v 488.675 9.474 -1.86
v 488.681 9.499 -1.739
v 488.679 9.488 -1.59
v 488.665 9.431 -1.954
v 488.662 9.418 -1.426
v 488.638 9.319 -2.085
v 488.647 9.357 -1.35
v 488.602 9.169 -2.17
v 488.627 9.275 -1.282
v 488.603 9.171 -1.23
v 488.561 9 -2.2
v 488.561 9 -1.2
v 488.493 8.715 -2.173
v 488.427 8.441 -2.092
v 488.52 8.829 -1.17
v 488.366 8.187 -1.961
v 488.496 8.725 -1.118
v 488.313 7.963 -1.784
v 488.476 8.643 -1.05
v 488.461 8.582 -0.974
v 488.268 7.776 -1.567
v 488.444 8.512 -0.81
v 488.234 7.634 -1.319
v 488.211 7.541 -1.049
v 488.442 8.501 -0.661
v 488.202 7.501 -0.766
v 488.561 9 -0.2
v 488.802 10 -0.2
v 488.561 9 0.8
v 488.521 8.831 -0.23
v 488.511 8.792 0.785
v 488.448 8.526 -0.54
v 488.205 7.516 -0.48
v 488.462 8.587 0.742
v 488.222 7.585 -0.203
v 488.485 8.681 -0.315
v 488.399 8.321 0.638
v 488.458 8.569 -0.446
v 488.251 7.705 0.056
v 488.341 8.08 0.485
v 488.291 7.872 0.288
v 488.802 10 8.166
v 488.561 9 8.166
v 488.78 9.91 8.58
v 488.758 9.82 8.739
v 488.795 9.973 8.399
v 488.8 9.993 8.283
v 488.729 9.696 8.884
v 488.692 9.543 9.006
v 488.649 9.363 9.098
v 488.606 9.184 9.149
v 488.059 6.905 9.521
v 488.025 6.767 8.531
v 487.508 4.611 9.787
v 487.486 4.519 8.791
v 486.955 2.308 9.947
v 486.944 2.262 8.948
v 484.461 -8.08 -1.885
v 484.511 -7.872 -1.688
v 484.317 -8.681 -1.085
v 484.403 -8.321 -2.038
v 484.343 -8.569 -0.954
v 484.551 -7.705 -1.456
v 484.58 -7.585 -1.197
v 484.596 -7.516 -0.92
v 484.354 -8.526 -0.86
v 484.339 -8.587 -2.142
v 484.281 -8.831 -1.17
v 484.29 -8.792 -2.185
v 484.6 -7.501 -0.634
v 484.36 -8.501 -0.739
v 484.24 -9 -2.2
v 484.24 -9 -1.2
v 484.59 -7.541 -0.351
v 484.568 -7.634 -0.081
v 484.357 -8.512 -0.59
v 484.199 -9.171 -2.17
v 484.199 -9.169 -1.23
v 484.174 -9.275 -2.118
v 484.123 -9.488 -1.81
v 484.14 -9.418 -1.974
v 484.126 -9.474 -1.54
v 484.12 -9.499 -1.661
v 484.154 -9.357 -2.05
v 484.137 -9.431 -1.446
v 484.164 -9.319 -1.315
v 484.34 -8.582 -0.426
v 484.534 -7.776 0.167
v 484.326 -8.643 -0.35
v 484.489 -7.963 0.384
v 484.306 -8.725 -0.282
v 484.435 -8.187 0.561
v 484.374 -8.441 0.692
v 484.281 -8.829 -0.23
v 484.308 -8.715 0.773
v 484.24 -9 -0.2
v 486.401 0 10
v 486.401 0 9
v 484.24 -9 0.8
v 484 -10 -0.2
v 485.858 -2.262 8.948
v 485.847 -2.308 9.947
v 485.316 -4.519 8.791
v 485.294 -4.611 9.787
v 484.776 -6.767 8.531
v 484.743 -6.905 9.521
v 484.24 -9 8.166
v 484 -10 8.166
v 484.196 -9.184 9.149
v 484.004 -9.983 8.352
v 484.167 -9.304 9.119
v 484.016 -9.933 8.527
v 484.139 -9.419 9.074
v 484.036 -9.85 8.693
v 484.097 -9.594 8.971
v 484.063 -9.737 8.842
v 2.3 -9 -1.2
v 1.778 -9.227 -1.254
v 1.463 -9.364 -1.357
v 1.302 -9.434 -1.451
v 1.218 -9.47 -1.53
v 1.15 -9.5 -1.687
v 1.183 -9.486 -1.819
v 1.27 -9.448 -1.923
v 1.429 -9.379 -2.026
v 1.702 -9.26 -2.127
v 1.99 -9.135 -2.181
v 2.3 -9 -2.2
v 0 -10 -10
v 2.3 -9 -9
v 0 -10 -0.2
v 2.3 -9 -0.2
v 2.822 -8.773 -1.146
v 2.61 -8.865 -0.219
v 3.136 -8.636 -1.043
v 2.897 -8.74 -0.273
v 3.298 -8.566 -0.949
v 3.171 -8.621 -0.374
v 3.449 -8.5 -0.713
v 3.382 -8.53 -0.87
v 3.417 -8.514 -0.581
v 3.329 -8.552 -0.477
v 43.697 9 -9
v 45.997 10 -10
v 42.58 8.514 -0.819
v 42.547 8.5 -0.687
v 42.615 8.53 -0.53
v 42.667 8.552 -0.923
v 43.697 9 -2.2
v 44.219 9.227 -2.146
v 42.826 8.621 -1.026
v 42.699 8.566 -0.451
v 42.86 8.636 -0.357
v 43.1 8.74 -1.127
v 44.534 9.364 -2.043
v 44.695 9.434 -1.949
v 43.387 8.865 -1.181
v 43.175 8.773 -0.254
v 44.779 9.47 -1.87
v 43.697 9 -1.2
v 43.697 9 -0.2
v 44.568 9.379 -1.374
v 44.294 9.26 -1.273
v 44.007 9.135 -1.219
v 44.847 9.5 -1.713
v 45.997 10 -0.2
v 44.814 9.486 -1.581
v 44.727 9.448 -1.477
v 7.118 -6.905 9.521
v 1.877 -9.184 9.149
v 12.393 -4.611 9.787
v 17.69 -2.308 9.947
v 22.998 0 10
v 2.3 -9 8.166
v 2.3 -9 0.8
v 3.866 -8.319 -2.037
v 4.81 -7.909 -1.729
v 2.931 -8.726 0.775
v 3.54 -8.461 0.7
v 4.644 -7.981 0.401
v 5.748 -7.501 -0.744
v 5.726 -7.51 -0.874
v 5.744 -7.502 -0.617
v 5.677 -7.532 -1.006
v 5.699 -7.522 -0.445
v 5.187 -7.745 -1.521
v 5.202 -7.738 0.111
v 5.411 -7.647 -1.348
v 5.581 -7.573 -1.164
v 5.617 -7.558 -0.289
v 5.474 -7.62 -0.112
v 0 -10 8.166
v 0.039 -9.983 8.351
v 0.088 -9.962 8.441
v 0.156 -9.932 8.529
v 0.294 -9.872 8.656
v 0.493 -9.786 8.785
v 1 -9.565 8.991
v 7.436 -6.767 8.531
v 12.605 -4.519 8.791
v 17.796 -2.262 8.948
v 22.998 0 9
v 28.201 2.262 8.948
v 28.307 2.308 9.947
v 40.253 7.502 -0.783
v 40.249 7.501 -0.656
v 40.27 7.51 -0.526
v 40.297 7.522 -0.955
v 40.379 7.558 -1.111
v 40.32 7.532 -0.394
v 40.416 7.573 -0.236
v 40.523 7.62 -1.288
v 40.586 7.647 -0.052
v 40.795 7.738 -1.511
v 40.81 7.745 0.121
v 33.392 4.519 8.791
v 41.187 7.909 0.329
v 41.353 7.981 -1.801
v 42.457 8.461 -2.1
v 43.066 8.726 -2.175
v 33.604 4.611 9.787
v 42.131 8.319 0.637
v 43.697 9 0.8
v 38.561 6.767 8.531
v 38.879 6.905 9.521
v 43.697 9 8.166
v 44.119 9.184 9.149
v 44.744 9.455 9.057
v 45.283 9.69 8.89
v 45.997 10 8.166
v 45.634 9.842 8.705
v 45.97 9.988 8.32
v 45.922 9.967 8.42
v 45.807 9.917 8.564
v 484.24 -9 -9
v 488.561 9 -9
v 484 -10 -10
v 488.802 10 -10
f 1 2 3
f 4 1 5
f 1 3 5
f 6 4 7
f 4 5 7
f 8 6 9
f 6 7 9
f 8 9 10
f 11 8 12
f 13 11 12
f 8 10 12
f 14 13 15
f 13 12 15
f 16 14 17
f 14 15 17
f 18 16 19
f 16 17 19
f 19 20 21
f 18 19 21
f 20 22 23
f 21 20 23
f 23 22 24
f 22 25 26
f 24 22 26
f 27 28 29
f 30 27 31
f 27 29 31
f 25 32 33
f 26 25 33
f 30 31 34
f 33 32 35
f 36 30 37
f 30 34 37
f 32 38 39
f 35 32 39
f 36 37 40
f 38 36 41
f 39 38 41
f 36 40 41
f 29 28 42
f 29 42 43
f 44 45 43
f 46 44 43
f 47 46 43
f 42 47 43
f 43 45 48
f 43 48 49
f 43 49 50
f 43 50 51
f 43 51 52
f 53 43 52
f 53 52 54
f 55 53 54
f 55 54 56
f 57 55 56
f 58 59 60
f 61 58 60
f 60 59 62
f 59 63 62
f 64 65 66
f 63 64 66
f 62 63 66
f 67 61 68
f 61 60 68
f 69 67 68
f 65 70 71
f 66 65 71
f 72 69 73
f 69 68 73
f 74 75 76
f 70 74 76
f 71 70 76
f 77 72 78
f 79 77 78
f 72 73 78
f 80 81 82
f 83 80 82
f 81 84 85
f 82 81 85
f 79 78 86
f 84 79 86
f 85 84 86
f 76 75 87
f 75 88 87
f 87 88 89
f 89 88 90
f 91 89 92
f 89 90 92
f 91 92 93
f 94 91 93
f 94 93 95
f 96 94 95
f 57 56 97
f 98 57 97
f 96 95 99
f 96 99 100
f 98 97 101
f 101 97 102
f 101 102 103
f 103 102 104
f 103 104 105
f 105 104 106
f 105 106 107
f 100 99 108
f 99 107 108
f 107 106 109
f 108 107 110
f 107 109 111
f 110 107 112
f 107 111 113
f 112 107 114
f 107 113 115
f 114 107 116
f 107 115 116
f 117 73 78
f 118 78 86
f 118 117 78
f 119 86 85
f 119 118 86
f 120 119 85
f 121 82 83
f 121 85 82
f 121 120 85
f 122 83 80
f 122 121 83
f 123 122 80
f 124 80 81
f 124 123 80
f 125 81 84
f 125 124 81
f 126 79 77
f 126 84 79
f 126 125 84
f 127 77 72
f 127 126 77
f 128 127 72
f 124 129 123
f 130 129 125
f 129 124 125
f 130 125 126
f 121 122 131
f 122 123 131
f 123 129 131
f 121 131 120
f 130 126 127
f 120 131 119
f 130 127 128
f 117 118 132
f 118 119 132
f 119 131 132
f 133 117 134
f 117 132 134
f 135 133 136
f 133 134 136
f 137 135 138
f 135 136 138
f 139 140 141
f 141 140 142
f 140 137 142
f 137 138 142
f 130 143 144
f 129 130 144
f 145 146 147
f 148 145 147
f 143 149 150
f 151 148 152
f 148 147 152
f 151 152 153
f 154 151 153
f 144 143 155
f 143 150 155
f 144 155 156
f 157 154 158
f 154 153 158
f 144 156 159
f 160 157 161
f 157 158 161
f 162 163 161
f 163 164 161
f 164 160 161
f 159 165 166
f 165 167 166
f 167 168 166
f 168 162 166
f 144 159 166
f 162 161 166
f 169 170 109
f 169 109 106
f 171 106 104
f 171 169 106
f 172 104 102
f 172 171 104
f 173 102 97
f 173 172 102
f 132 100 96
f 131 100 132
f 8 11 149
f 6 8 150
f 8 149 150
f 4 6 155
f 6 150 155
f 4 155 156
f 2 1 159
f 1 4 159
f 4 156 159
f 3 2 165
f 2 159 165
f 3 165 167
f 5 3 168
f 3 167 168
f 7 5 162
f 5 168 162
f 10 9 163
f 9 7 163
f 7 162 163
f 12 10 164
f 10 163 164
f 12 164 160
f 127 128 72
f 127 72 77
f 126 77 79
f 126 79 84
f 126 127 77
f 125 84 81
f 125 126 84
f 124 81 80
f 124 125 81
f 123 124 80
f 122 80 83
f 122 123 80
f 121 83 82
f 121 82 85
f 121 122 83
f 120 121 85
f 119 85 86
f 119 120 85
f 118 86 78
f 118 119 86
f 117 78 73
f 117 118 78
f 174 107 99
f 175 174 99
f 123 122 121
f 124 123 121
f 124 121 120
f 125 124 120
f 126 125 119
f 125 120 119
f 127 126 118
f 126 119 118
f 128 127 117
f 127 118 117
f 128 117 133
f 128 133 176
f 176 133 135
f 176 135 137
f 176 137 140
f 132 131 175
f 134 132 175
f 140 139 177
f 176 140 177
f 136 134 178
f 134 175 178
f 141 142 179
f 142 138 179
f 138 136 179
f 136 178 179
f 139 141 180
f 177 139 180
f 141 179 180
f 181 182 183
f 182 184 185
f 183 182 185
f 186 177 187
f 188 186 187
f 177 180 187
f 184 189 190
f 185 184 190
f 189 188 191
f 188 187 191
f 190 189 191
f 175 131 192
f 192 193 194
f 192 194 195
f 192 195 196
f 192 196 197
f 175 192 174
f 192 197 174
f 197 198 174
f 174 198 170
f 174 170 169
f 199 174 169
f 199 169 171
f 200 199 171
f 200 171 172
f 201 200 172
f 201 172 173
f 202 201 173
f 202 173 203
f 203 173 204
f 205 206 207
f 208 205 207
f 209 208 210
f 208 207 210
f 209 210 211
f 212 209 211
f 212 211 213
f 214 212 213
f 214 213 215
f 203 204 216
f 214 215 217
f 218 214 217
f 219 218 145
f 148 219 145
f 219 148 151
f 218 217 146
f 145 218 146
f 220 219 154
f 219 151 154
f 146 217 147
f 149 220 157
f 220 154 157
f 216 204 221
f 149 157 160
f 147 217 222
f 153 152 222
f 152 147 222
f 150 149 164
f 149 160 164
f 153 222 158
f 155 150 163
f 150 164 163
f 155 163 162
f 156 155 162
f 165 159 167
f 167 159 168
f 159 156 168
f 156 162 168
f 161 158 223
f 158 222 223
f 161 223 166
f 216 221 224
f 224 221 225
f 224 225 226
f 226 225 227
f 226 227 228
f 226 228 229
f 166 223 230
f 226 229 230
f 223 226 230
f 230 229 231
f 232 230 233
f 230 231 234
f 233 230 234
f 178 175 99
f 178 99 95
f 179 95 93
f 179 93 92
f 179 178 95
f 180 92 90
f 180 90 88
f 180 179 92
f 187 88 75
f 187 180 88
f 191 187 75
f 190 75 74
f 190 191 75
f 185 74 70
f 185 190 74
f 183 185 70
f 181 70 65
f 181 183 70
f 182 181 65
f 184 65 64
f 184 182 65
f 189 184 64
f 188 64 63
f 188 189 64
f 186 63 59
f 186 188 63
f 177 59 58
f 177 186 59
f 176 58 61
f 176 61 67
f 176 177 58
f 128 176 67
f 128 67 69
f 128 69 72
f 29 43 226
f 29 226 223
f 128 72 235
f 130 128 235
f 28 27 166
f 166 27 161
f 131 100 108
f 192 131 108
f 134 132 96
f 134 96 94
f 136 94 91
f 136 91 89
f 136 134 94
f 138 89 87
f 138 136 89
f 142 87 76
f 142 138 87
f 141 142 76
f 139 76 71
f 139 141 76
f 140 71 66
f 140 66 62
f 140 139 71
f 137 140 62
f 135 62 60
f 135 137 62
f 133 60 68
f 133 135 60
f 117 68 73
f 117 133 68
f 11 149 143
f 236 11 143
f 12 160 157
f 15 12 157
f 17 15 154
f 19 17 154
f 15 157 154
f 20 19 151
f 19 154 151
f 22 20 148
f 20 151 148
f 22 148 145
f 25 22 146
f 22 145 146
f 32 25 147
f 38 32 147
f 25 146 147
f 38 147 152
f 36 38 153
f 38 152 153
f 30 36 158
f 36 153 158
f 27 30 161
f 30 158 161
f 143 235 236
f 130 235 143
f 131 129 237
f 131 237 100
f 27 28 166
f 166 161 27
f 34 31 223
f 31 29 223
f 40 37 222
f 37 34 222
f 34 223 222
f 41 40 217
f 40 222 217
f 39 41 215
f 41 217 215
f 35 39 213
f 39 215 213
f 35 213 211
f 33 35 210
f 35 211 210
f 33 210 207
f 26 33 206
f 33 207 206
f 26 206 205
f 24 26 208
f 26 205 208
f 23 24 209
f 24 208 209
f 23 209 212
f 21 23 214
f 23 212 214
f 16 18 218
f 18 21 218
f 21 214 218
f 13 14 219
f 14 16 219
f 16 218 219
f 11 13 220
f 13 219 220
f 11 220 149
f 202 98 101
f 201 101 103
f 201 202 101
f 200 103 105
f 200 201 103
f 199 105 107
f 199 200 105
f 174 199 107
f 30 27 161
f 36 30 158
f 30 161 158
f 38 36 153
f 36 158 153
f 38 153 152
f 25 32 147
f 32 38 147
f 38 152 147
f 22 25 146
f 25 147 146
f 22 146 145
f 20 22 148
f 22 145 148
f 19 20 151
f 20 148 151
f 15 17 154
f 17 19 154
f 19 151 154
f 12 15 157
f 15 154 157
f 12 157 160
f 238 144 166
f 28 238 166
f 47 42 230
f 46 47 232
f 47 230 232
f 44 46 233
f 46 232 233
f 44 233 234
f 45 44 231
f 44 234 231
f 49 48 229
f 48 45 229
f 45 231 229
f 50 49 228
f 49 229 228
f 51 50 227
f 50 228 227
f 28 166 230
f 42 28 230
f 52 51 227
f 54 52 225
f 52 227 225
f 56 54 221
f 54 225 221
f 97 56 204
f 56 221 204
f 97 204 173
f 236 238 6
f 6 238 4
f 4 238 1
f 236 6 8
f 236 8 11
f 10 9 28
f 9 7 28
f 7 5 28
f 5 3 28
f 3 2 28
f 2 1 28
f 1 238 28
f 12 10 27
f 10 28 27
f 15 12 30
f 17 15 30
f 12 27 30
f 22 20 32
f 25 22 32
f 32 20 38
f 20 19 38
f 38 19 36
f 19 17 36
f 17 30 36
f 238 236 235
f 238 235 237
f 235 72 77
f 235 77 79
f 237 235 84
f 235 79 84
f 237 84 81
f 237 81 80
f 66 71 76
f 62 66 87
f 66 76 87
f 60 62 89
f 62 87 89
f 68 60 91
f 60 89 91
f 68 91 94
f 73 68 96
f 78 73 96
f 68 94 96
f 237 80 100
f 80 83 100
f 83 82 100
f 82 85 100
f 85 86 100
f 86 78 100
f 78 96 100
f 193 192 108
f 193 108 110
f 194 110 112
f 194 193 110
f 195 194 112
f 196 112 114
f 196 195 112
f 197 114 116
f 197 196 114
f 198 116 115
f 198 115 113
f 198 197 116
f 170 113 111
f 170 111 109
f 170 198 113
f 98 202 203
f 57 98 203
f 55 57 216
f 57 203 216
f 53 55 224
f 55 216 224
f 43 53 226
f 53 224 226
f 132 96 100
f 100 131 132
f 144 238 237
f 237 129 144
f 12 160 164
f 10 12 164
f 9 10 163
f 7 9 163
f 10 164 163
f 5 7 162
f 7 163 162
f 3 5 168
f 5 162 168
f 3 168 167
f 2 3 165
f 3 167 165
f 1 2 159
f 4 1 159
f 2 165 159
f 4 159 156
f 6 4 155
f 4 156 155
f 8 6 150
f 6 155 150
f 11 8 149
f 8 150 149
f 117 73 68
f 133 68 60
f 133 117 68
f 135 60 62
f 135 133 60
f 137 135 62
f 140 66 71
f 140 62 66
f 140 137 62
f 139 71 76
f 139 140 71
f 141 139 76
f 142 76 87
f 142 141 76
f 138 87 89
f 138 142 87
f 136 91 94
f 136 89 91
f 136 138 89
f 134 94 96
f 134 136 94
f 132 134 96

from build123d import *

# Parameters (mm, degrees)
F2_DEPTH      = 1000
F4_DEPTH      = 1000
F8_DEPTH      = 10.001
F8_DEPTH_BACK = 10.001


with BuildPart() as f2:
    # F1 (on Right) → F2 (new body)
    with BuildSketch(Plane.YZ):
        with BuildLine():
            Line((0, -9), (0, -10))
            Line((0, -10), (10, -10))
            Line((10, -10), (10, -0.2))
            Line((10, -0.2), (9, -0.2))
            ThreePointArc((9, -0.2), (8.5, -0.7), (9, -1.2))
            ThreePointArc((9, -1.2), (9.5, -1.7), (9, -2.2))
            Line((9, -2.2), (9, -9))
            Line((9, -9), (0, -9))
        make_face()
    extrude(amount=F2_DEPTH)

    # F5: F2 across plane


with BuildPart() as f4:
    # F3 (on Right) → F4 (new body)
    with BuildSketch(Plane.YZ):
        with BuildLine():
            Line((9, -0.2), (10, -0.2))
            Line((10, -0.2), (10, 8.1663783152))
            ThreePointArc((10, 8.1663783152), (9.7693092582, 8.8052548802), (9.1836734694, 9.1493656277))
            ThreePointArc((9.1836734694, 9.1493656277), (4.6114920912, 9.7868872364), (0, 10))
            Line((0, 10), (0, 9))
            ThreePointArc((0, 9), (4.5192622493, 8.7911494917), (9, 8.1663783152))
            Line((9, 8.1663783152), (9, 0.8))
            ThreePointArc((9, 0.8), (7.5, -0.7), (9, -2.2))
            ThreePointArc((9, -2.2), (9.5, -1.7), (9, -1.2))
            ThreePointArc((9, -1.2), (8.5, -0.7), (9, -0.2))
        make_face()
    extrude(amount=F4_DEPTH)

    # F6: F4 across plane


with BuildPart() as f2_1:
    add(f2.part)
    add(f2.part.mirror(Plane.XZ))


with BuildPart() as f4_1:
    add(f4.part)
    add(f4.part.mirror(Plane.XZ))


with BuildPart() as f8_tool:
    # F7 (on Top) → F8 (new body, two sides)
    with BuildSketch(Plane.XY) as f8_sk:
        Polygon((0, 10), (0, 0), (0, -10), (45.9968509447, 10), align=None)
        Polygon((709.9114181152, 10), (488.8015751816, 10), (484, -10), (1016.9613361359, -10), (1016.9613361359, 10), align=None)
    extrude(amount=F8_DEPTH)
    extrude(f8_sk.sketch, amount=-F8_DEPTH_BACK)


with BuildPart() as f2_2:
    add(f2_1.part)

    # F8: cut by f8_tool
    add(f8_tool.part, mode=Mode.SUBTRACT)


with BuildPart() as f4_2:
    add(f4_1.part)

    # F8: cut by f8_tool
    add(f8_tool.part, mode=Mode.SUBTRACT)


solid = Compound([f2_2.part, f4_2.part])
